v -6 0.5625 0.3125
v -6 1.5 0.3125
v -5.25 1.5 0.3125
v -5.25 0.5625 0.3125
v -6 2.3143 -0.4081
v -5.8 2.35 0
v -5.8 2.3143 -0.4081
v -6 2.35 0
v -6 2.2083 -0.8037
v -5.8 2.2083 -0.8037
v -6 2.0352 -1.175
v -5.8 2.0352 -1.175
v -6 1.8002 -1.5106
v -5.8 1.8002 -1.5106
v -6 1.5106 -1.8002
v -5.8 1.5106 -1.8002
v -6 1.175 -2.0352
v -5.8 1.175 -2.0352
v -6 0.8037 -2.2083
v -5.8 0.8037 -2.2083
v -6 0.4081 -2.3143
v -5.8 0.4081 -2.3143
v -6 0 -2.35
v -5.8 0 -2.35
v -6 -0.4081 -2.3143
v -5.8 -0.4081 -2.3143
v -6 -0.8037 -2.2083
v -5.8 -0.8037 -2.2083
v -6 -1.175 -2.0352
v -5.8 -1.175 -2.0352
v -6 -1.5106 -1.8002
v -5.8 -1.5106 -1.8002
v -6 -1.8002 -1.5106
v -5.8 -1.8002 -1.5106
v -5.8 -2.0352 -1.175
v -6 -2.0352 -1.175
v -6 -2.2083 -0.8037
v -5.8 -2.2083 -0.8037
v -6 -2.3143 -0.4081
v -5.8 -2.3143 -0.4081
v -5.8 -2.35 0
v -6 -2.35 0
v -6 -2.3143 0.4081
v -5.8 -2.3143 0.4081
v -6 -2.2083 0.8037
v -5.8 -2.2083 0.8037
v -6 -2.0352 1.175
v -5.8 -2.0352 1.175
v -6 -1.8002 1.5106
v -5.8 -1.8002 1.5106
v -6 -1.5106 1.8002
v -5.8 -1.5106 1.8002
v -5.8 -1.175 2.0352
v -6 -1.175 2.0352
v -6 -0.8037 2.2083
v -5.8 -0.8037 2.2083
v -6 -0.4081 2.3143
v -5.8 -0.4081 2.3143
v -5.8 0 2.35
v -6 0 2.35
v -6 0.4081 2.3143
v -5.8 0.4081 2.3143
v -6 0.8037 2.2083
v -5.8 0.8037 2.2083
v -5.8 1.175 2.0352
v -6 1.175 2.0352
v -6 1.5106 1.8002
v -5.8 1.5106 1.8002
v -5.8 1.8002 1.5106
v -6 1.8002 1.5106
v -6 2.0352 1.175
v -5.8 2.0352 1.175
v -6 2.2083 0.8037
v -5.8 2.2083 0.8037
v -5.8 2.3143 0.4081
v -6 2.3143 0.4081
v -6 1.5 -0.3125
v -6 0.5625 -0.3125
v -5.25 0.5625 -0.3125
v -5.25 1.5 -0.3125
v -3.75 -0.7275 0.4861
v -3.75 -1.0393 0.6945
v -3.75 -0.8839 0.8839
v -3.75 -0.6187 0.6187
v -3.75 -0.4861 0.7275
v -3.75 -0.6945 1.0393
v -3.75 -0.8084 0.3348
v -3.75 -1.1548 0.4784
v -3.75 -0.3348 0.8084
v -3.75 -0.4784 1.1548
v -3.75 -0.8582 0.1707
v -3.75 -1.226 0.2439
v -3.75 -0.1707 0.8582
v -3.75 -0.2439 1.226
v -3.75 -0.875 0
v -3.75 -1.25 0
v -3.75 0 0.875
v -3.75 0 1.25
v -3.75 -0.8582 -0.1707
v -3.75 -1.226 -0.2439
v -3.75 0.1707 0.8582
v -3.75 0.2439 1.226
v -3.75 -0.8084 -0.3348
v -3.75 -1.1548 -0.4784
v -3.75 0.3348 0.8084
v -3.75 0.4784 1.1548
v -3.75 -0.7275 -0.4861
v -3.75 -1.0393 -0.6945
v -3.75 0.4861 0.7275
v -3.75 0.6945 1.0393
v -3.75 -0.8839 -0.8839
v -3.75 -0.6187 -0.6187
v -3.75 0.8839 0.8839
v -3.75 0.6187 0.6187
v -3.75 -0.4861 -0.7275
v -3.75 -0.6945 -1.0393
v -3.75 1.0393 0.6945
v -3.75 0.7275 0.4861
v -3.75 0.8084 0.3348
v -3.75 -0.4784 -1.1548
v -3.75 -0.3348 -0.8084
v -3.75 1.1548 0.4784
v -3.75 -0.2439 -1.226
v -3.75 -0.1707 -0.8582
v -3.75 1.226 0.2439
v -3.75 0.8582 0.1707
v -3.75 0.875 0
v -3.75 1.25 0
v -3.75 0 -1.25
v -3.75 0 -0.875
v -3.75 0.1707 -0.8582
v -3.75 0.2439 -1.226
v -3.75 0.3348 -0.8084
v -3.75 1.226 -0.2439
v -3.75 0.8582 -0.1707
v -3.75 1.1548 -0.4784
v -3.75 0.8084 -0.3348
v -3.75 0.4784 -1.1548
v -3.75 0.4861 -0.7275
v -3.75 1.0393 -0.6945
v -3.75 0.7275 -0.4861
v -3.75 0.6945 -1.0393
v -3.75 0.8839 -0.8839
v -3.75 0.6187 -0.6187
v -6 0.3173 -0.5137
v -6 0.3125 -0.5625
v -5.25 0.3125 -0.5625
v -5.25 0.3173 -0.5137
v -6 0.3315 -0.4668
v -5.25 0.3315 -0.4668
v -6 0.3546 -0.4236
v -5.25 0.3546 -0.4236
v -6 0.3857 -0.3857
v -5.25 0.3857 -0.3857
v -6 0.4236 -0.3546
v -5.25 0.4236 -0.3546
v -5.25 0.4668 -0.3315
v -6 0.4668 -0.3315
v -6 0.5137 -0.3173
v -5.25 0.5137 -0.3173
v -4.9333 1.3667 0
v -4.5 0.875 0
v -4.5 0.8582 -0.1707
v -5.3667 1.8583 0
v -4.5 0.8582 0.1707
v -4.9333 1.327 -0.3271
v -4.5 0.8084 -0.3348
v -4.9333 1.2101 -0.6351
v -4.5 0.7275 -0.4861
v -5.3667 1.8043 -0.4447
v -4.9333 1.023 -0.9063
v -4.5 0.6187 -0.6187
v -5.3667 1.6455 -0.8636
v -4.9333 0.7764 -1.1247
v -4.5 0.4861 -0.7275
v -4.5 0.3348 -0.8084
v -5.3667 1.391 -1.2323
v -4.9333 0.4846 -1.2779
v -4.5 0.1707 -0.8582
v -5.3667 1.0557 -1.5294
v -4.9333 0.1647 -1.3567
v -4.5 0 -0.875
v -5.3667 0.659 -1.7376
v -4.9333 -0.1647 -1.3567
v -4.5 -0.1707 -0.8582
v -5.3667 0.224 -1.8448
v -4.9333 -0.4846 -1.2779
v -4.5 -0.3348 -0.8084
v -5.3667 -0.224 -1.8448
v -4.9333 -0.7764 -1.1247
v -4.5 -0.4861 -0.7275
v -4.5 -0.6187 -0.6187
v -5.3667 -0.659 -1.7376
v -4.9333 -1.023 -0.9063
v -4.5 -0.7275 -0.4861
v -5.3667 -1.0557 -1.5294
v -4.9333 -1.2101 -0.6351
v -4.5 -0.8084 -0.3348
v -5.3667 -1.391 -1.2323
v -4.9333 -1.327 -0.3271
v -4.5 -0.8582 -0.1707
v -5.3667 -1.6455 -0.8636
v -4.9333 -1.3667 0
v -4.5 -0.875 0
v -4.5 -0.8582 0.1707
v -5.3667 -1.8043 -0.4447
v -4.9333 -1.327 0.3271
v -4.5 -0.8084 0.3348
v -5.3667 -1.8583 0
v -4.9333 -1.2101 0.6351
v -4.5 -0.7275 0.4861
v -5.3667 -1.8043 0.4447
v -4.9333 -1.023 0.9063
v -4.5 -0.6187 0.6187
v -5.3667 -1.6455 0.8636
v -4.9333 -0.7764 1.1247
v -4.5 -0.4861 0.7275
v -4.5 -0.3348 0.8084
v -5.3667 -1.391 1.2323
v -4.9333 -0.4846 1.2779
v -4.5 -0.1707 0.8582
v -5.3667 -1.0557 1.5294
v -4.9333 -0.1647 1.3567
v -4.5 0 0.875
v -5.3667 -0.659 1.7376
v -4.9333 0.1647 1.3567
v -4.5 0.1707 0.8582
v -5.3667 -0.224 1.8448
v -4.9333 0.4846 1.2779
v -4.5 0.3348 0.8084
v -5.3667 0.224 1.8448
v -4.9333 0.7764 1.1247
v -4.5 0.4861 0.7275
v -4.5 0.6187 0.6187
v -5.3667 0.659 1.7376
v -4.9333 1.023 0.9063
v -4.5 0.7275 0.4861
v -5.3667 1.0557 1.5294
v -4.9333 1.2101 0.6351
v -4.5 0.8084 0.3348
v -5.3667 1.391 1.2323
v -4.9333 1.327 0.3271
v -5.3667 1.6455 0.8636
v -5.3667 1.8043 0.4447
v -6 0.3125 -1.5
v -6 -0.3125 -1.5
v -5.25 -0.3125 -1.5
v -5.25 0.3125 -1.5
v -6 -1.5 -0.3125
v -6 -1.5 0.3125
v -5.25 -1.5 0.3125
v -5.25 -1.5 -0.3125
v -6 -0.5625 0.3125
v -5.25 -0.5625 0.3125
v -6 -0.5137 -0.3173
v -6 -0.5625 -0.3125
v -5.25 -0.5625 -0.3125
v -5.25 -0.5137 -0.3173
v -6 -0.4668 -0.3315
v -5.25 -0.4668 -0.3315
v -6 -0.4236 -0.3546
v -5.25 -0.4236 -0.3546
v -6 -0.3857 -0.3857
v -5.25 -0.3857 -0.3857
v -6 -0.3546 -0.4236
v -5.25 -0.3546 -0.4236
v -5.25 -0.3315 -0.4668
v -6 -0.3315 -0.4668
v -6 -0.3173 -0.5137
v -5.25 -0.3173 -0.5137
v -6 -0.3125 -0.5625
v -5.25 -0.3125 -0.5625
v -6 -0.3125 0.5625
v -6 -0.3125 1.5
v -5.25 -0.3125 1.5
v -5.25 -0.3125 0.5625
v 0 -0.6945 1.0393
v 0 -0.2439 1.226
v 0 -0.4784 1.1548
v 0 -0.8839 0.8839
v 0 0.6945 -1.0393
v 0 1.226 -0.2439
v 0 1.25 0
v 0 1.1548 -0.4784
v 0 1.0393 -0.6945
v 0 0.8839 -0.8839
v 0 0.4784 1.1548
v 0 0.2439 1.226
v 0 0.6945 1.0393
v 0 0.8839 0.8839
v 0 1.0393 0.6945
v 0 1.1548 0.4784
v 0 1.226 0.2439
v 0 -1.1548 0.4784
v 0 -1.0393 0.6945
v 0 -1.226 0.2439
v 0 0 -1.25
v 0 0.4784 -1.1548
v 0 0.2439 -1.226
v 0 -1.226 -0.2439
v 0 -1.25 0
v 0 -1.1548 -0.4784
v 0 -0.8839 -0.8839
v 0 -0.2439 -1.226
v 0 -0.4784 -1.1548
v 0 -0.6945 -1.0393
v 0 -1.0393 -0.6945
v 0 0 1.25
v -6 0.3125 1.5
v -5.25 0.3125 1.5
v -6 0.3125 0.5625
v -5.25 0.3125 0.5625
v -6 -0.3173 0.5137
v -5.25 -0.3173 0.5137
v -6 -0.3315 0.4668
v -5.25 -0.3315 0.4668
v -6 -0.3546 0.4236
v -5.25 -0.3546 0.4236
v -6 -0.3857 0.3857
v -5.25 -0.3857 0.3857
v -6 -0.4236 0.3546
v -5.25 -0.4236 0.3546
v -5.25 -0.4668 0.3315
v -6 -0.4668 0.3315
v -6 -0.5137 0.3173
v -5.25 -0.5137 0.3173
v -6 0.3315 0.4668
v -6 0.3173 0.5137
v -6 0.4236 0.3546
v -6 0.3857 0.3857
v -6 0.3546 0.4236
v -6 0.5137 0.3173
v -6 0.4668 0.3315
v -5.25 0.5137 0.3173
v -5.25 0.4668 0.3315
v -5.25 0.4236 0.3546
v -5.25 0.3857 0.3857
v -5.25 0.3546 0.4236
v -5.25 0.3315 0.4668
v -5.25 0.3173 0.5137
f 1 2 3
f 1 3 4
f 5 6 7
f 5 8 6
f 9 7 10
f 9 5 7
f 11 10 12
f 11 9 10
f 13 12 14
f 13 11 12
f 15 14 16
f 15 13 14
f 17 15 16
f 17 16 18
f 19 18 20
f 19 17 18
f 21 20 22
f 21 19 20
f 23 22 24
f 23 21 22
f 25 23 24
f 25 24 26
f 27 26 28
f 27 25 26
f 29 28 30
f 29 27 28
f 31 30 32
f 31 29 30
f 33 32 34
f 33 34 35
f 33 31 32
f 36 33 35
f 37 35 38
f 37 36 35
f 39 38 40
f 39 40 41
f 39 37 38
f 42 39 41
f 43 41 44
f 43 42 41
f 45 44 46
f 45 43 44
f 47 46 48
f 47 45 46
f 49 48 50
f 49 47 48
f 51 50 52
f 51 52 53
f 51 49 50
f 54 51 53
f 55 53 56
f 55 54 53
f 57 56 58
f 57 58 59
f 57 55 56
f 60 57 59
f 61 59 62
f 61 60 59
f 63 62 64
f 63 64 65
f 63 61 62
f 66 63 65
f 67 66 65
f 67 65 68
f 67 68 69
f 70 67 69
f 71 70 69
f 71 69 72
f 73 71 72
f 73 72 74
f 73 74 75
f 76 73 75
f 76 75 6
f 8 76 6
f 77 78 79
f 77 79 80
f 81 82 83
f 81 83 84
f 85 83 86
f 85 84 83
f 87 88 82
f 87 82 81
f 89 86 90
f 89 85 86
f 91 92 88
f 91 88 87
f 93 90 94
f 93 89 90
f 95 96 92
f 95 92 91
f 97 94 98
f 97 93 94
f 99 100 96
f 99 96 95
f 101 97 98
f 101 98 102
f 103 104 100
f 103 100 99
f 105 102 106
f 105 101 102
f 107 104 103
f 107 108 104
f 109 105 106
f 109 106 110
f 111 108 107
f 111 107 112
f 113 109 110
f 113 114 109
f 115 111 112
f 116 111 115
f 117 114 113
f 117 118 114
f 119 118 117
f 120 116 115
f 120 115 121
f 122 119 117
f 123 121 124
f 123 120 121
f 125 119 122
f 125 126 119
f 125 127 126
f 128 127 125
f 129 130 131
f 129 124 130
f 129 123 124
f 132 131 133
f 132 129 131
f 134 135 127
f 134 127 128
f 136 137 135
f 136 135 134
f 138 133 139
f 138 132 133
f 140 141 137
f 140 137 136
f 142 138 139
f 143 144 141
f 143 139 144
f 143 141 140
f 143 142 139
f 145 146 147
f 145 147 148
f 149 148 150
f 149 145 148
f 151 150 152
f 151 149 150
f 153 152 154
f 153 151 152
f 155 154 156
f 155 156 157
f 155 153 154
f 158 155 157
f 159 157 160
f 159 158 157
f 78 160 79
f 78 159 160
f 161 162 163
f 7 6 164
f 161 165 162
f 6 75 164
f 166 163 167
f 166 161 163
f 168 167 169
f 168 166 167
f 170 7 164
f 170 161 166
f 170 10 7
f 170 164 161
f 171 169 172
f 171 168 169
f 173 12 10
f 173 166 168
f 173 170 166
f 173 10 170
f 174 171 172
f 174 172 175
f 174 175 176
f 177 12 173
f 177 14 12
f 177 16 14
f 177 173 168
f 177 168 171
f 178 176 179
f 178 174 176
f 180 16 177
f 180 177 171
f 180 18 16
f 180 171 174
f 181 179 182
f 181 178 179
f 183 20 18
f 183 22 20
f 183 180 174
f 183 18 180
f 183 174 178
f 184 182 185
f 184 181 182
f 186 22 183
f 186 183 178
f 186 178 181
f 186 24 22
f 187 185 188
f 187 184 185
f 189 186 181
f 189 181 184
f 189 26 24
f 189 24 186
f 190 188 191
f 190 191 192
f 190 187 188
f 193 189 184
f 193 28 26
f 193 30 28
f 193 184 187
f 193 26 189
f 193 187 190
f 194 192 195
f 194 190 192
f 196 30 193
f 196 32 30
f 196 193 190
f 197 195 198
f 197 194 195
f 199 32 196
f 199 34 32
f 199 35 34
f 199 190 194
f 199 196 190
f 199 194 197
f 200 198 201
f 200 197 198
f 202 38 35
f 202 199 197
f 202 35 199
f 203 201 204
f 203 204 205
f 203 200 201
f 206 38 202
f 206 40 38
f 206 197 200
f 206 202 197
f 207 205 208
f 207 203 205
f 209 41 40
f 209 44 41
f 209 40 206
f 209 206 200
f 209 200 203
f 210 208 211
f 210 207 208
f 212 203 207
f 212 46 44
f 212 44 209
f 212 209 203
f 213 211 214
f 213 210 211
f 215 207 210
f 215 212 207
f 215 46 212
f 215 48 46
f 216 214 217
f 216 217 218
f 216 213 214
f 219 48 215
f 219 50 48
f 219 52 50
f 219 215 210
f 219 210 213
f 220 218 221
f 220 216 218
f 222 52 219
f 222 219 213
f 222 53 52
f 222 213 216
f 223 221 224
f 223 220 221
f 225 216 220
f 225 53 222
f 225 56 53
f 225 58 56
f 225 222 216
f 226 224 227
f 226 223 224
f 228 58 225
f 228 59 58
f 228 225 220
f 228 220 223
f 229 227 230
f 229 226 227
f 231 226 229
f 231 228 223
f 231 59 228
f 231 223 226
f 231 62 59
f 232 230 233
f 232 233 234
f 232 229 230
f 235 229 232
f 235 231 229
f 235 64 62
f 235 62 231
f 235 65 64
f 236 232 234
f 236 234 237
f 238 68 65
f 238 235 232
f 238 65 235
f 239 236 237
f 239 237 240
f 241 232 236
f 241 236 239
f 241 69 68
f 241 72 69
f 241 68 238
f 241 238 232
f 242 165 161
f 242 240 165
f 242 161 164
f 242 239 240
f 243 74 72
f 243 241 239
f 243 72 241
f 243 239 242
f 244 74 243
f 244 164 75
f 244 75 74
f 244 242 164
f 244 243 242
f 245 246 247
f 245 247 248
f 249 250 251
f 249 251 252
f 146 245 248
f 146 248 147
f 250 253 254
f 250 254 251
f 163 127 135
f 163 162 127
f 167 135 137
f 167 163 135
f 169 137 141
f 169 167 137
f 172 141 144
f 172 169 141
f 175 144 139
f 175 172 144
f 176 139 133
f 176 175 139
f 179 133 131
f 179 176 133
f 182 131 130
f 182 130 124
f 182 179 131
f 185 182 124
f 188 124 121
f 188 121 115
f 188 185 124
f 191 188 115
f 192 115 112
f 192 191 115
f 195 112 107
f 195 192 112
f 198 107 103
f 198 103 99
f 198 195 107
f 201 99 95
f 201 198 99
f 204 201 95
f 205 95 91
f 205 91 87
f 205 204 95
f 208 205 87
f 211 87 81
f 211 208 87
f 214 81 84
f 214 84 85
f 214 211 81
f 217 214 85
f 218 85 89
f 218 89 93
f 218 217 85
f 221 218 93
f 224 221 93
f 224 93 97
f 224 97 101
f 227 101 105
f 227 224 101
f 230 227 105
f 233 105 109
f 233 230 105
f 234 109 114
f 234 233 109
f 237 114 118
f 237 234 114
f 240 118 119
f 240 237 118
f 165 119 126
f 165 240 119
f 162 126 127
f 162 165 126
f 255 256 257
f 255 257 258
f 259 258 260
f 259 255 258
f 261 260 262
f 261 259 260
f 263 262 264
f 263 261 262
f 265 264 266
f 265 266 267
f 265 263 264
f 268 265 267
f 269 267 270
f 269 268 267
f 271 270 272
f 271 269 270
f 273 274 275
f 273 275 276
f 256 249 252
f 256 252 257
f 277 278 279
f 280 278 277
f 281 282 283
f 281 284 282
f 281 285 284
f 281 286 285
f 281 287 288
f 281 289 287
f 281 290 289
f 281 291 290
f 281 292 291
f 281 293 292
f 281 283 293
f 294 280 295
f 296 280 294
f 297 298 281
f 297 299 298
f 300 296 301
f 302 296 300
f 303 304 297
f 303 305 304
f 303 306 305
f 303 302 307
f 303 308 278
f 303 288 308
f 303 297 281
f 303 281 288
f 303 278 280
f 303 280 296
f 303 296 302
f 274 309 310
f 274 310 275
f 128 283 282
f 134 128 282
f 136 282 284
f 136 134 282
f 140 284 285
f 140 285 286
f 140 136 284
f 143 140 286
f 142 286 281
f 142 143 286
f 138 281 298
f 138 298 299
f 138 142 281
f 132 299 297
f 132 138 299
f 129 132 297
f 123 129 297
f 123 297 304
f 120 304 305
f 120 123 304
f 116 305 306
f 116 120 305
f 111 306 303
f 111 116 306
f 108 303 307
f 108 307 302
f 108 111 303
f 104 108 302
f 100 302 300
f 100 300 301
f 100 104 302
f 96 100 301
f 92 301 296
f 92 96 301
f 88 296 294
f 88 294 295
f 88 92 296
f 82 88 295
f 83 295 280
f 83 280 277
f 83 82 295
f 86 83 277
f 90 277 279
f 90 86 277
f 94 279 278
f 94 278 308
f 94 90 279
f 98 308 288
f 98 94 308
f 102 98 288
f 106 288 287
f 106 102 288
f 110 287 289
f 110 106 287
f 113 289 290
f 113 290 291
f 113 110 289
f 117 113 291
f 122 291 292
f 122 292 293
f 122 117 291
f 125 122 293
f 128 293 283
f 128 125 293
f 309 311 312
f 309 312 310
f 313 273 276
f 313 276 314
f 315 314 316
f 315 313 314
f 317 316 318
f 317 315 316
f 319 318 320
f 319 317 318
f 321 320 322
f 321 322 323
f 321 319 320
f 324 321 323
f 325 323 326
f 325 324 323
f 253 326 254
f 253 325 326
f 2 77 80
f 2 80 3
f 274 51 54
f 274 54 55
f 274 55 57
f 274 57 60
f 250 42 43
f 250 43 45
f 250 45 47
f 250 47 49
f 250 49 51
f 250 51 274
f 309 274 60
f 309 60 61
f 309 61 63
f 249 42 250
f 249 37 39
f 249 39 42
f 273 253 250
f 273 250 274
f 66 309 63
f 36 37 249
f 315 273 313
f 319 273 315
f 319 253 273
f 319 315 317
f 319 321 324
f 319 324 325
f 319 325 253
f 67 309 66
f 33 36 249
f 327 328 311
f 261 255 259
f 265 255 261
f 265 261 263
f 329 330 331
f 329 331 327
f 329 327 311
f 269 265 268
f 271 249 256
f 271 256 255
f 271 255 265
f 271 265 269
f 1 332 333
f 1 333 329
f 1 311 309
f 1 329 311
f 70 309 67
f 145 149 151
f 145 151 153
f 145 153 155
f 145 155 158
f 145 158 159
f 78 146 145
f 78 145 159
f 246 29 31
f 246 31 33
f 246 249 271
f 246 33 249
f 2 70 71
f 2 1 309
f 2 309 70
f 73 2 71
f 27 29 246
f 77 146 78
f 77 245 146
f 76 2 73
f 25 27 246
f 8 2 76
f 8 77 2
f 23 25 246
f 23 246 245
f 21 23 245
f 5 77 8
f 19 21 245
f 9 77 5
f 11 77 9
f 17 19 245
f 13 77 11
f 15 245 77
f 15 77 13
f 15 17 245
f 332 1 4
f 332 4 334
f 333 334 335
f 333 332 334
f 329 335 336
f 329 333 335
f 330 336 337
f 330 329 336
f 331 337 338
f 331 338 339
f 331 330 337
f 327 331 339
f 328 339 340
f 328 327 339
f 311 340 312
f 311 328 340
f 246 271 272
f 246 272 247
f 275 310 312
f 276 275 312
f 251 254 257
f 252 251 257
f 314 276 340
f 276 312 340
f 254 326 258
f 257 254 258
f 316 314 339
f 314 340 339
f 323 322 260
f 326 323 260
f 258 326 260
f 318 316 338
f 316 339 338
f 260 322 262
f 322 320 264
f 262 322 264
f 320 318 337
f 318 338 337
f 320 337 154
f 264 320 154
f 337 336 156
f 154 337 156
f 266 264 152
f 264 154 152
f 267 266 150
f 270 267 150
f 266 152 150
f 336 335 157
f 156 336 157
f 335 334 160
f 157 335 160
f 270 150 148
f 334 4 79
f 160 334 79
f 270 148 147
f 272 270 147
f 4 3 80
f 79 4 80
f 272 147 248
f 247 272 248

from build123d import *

# Parameters (mm, degrees)
CUT_EXTRUDE_1_DEPTH = 0.75


with BuildPart() as part:
    # 草图1 → 旋转1 (revolve)
    with BuildSketch(Plane.XY):
        Polygon((0, 0), (0, 1.25), (-3.75, 1.25), (-3.75, 0.875), (-4.5, 0.875), (-5.8, 2.35), (-6, 2.35), (-6, 0), align=None)
    revolve(axis=Axis((0, 0, 0), (-1, 0, 0)))

    # 草图2 → 切除-拉伸1 (cut)
    with BuildSketch(Plane.ZY.offset(6)):
        with BuildLine():
            Line((-0.3125, 1.5), (0.3125, 1.5))
            Line((0.3125, 1.5), (0.3125, 0.5625))
            ThreePointArc((0.3125, 0.5625), (0.385723305, 0.385723305), (0.5625, 0.3125))
            Line((0.5625, 0.3125), (1.5, 0.3125))
            Line((1.5, 0.3125), (1.5, -0.3125))
            Line((1.5, -0.3125), (0.5625, -0.3125))
            ThreePointArc((0.5625, -0.3125), (0.385723305, -0.385723305), (0.3125, -0.5625))
            Line((0.3125, -0.5625), (0.3125, -1.5))
            Line((0.3125, -1.5), (-0.3125, -1.5))
            Line((-0.3125, -1.5), (-0.3125, -0.5625))
            ThreePointArc((-0.3125, -0.5625), (-0.385723305, -0.385723305), (-0.5625, -0.3125))
            Line((-0.5625, -0.3125), (-1.5, -0.3125))
            Line((-1.5, -0.3125), (-1.5, 0.3125))
            Line((-1.5, 0.3125), (-0.5625, 0.3125))
            ThreePointArc((-0.5625, 0.3125), (-0.385723305, 0.385723305), (-0.3125, 0.5625))
            Line((-0.3125, 0.5625), (-0.3125, 1.5))
        make_face()
    extrude(amount=-CUT_EXTRUDE_1_DEPTH, mode=Mode.SUBTRACT)


solid = part.part
